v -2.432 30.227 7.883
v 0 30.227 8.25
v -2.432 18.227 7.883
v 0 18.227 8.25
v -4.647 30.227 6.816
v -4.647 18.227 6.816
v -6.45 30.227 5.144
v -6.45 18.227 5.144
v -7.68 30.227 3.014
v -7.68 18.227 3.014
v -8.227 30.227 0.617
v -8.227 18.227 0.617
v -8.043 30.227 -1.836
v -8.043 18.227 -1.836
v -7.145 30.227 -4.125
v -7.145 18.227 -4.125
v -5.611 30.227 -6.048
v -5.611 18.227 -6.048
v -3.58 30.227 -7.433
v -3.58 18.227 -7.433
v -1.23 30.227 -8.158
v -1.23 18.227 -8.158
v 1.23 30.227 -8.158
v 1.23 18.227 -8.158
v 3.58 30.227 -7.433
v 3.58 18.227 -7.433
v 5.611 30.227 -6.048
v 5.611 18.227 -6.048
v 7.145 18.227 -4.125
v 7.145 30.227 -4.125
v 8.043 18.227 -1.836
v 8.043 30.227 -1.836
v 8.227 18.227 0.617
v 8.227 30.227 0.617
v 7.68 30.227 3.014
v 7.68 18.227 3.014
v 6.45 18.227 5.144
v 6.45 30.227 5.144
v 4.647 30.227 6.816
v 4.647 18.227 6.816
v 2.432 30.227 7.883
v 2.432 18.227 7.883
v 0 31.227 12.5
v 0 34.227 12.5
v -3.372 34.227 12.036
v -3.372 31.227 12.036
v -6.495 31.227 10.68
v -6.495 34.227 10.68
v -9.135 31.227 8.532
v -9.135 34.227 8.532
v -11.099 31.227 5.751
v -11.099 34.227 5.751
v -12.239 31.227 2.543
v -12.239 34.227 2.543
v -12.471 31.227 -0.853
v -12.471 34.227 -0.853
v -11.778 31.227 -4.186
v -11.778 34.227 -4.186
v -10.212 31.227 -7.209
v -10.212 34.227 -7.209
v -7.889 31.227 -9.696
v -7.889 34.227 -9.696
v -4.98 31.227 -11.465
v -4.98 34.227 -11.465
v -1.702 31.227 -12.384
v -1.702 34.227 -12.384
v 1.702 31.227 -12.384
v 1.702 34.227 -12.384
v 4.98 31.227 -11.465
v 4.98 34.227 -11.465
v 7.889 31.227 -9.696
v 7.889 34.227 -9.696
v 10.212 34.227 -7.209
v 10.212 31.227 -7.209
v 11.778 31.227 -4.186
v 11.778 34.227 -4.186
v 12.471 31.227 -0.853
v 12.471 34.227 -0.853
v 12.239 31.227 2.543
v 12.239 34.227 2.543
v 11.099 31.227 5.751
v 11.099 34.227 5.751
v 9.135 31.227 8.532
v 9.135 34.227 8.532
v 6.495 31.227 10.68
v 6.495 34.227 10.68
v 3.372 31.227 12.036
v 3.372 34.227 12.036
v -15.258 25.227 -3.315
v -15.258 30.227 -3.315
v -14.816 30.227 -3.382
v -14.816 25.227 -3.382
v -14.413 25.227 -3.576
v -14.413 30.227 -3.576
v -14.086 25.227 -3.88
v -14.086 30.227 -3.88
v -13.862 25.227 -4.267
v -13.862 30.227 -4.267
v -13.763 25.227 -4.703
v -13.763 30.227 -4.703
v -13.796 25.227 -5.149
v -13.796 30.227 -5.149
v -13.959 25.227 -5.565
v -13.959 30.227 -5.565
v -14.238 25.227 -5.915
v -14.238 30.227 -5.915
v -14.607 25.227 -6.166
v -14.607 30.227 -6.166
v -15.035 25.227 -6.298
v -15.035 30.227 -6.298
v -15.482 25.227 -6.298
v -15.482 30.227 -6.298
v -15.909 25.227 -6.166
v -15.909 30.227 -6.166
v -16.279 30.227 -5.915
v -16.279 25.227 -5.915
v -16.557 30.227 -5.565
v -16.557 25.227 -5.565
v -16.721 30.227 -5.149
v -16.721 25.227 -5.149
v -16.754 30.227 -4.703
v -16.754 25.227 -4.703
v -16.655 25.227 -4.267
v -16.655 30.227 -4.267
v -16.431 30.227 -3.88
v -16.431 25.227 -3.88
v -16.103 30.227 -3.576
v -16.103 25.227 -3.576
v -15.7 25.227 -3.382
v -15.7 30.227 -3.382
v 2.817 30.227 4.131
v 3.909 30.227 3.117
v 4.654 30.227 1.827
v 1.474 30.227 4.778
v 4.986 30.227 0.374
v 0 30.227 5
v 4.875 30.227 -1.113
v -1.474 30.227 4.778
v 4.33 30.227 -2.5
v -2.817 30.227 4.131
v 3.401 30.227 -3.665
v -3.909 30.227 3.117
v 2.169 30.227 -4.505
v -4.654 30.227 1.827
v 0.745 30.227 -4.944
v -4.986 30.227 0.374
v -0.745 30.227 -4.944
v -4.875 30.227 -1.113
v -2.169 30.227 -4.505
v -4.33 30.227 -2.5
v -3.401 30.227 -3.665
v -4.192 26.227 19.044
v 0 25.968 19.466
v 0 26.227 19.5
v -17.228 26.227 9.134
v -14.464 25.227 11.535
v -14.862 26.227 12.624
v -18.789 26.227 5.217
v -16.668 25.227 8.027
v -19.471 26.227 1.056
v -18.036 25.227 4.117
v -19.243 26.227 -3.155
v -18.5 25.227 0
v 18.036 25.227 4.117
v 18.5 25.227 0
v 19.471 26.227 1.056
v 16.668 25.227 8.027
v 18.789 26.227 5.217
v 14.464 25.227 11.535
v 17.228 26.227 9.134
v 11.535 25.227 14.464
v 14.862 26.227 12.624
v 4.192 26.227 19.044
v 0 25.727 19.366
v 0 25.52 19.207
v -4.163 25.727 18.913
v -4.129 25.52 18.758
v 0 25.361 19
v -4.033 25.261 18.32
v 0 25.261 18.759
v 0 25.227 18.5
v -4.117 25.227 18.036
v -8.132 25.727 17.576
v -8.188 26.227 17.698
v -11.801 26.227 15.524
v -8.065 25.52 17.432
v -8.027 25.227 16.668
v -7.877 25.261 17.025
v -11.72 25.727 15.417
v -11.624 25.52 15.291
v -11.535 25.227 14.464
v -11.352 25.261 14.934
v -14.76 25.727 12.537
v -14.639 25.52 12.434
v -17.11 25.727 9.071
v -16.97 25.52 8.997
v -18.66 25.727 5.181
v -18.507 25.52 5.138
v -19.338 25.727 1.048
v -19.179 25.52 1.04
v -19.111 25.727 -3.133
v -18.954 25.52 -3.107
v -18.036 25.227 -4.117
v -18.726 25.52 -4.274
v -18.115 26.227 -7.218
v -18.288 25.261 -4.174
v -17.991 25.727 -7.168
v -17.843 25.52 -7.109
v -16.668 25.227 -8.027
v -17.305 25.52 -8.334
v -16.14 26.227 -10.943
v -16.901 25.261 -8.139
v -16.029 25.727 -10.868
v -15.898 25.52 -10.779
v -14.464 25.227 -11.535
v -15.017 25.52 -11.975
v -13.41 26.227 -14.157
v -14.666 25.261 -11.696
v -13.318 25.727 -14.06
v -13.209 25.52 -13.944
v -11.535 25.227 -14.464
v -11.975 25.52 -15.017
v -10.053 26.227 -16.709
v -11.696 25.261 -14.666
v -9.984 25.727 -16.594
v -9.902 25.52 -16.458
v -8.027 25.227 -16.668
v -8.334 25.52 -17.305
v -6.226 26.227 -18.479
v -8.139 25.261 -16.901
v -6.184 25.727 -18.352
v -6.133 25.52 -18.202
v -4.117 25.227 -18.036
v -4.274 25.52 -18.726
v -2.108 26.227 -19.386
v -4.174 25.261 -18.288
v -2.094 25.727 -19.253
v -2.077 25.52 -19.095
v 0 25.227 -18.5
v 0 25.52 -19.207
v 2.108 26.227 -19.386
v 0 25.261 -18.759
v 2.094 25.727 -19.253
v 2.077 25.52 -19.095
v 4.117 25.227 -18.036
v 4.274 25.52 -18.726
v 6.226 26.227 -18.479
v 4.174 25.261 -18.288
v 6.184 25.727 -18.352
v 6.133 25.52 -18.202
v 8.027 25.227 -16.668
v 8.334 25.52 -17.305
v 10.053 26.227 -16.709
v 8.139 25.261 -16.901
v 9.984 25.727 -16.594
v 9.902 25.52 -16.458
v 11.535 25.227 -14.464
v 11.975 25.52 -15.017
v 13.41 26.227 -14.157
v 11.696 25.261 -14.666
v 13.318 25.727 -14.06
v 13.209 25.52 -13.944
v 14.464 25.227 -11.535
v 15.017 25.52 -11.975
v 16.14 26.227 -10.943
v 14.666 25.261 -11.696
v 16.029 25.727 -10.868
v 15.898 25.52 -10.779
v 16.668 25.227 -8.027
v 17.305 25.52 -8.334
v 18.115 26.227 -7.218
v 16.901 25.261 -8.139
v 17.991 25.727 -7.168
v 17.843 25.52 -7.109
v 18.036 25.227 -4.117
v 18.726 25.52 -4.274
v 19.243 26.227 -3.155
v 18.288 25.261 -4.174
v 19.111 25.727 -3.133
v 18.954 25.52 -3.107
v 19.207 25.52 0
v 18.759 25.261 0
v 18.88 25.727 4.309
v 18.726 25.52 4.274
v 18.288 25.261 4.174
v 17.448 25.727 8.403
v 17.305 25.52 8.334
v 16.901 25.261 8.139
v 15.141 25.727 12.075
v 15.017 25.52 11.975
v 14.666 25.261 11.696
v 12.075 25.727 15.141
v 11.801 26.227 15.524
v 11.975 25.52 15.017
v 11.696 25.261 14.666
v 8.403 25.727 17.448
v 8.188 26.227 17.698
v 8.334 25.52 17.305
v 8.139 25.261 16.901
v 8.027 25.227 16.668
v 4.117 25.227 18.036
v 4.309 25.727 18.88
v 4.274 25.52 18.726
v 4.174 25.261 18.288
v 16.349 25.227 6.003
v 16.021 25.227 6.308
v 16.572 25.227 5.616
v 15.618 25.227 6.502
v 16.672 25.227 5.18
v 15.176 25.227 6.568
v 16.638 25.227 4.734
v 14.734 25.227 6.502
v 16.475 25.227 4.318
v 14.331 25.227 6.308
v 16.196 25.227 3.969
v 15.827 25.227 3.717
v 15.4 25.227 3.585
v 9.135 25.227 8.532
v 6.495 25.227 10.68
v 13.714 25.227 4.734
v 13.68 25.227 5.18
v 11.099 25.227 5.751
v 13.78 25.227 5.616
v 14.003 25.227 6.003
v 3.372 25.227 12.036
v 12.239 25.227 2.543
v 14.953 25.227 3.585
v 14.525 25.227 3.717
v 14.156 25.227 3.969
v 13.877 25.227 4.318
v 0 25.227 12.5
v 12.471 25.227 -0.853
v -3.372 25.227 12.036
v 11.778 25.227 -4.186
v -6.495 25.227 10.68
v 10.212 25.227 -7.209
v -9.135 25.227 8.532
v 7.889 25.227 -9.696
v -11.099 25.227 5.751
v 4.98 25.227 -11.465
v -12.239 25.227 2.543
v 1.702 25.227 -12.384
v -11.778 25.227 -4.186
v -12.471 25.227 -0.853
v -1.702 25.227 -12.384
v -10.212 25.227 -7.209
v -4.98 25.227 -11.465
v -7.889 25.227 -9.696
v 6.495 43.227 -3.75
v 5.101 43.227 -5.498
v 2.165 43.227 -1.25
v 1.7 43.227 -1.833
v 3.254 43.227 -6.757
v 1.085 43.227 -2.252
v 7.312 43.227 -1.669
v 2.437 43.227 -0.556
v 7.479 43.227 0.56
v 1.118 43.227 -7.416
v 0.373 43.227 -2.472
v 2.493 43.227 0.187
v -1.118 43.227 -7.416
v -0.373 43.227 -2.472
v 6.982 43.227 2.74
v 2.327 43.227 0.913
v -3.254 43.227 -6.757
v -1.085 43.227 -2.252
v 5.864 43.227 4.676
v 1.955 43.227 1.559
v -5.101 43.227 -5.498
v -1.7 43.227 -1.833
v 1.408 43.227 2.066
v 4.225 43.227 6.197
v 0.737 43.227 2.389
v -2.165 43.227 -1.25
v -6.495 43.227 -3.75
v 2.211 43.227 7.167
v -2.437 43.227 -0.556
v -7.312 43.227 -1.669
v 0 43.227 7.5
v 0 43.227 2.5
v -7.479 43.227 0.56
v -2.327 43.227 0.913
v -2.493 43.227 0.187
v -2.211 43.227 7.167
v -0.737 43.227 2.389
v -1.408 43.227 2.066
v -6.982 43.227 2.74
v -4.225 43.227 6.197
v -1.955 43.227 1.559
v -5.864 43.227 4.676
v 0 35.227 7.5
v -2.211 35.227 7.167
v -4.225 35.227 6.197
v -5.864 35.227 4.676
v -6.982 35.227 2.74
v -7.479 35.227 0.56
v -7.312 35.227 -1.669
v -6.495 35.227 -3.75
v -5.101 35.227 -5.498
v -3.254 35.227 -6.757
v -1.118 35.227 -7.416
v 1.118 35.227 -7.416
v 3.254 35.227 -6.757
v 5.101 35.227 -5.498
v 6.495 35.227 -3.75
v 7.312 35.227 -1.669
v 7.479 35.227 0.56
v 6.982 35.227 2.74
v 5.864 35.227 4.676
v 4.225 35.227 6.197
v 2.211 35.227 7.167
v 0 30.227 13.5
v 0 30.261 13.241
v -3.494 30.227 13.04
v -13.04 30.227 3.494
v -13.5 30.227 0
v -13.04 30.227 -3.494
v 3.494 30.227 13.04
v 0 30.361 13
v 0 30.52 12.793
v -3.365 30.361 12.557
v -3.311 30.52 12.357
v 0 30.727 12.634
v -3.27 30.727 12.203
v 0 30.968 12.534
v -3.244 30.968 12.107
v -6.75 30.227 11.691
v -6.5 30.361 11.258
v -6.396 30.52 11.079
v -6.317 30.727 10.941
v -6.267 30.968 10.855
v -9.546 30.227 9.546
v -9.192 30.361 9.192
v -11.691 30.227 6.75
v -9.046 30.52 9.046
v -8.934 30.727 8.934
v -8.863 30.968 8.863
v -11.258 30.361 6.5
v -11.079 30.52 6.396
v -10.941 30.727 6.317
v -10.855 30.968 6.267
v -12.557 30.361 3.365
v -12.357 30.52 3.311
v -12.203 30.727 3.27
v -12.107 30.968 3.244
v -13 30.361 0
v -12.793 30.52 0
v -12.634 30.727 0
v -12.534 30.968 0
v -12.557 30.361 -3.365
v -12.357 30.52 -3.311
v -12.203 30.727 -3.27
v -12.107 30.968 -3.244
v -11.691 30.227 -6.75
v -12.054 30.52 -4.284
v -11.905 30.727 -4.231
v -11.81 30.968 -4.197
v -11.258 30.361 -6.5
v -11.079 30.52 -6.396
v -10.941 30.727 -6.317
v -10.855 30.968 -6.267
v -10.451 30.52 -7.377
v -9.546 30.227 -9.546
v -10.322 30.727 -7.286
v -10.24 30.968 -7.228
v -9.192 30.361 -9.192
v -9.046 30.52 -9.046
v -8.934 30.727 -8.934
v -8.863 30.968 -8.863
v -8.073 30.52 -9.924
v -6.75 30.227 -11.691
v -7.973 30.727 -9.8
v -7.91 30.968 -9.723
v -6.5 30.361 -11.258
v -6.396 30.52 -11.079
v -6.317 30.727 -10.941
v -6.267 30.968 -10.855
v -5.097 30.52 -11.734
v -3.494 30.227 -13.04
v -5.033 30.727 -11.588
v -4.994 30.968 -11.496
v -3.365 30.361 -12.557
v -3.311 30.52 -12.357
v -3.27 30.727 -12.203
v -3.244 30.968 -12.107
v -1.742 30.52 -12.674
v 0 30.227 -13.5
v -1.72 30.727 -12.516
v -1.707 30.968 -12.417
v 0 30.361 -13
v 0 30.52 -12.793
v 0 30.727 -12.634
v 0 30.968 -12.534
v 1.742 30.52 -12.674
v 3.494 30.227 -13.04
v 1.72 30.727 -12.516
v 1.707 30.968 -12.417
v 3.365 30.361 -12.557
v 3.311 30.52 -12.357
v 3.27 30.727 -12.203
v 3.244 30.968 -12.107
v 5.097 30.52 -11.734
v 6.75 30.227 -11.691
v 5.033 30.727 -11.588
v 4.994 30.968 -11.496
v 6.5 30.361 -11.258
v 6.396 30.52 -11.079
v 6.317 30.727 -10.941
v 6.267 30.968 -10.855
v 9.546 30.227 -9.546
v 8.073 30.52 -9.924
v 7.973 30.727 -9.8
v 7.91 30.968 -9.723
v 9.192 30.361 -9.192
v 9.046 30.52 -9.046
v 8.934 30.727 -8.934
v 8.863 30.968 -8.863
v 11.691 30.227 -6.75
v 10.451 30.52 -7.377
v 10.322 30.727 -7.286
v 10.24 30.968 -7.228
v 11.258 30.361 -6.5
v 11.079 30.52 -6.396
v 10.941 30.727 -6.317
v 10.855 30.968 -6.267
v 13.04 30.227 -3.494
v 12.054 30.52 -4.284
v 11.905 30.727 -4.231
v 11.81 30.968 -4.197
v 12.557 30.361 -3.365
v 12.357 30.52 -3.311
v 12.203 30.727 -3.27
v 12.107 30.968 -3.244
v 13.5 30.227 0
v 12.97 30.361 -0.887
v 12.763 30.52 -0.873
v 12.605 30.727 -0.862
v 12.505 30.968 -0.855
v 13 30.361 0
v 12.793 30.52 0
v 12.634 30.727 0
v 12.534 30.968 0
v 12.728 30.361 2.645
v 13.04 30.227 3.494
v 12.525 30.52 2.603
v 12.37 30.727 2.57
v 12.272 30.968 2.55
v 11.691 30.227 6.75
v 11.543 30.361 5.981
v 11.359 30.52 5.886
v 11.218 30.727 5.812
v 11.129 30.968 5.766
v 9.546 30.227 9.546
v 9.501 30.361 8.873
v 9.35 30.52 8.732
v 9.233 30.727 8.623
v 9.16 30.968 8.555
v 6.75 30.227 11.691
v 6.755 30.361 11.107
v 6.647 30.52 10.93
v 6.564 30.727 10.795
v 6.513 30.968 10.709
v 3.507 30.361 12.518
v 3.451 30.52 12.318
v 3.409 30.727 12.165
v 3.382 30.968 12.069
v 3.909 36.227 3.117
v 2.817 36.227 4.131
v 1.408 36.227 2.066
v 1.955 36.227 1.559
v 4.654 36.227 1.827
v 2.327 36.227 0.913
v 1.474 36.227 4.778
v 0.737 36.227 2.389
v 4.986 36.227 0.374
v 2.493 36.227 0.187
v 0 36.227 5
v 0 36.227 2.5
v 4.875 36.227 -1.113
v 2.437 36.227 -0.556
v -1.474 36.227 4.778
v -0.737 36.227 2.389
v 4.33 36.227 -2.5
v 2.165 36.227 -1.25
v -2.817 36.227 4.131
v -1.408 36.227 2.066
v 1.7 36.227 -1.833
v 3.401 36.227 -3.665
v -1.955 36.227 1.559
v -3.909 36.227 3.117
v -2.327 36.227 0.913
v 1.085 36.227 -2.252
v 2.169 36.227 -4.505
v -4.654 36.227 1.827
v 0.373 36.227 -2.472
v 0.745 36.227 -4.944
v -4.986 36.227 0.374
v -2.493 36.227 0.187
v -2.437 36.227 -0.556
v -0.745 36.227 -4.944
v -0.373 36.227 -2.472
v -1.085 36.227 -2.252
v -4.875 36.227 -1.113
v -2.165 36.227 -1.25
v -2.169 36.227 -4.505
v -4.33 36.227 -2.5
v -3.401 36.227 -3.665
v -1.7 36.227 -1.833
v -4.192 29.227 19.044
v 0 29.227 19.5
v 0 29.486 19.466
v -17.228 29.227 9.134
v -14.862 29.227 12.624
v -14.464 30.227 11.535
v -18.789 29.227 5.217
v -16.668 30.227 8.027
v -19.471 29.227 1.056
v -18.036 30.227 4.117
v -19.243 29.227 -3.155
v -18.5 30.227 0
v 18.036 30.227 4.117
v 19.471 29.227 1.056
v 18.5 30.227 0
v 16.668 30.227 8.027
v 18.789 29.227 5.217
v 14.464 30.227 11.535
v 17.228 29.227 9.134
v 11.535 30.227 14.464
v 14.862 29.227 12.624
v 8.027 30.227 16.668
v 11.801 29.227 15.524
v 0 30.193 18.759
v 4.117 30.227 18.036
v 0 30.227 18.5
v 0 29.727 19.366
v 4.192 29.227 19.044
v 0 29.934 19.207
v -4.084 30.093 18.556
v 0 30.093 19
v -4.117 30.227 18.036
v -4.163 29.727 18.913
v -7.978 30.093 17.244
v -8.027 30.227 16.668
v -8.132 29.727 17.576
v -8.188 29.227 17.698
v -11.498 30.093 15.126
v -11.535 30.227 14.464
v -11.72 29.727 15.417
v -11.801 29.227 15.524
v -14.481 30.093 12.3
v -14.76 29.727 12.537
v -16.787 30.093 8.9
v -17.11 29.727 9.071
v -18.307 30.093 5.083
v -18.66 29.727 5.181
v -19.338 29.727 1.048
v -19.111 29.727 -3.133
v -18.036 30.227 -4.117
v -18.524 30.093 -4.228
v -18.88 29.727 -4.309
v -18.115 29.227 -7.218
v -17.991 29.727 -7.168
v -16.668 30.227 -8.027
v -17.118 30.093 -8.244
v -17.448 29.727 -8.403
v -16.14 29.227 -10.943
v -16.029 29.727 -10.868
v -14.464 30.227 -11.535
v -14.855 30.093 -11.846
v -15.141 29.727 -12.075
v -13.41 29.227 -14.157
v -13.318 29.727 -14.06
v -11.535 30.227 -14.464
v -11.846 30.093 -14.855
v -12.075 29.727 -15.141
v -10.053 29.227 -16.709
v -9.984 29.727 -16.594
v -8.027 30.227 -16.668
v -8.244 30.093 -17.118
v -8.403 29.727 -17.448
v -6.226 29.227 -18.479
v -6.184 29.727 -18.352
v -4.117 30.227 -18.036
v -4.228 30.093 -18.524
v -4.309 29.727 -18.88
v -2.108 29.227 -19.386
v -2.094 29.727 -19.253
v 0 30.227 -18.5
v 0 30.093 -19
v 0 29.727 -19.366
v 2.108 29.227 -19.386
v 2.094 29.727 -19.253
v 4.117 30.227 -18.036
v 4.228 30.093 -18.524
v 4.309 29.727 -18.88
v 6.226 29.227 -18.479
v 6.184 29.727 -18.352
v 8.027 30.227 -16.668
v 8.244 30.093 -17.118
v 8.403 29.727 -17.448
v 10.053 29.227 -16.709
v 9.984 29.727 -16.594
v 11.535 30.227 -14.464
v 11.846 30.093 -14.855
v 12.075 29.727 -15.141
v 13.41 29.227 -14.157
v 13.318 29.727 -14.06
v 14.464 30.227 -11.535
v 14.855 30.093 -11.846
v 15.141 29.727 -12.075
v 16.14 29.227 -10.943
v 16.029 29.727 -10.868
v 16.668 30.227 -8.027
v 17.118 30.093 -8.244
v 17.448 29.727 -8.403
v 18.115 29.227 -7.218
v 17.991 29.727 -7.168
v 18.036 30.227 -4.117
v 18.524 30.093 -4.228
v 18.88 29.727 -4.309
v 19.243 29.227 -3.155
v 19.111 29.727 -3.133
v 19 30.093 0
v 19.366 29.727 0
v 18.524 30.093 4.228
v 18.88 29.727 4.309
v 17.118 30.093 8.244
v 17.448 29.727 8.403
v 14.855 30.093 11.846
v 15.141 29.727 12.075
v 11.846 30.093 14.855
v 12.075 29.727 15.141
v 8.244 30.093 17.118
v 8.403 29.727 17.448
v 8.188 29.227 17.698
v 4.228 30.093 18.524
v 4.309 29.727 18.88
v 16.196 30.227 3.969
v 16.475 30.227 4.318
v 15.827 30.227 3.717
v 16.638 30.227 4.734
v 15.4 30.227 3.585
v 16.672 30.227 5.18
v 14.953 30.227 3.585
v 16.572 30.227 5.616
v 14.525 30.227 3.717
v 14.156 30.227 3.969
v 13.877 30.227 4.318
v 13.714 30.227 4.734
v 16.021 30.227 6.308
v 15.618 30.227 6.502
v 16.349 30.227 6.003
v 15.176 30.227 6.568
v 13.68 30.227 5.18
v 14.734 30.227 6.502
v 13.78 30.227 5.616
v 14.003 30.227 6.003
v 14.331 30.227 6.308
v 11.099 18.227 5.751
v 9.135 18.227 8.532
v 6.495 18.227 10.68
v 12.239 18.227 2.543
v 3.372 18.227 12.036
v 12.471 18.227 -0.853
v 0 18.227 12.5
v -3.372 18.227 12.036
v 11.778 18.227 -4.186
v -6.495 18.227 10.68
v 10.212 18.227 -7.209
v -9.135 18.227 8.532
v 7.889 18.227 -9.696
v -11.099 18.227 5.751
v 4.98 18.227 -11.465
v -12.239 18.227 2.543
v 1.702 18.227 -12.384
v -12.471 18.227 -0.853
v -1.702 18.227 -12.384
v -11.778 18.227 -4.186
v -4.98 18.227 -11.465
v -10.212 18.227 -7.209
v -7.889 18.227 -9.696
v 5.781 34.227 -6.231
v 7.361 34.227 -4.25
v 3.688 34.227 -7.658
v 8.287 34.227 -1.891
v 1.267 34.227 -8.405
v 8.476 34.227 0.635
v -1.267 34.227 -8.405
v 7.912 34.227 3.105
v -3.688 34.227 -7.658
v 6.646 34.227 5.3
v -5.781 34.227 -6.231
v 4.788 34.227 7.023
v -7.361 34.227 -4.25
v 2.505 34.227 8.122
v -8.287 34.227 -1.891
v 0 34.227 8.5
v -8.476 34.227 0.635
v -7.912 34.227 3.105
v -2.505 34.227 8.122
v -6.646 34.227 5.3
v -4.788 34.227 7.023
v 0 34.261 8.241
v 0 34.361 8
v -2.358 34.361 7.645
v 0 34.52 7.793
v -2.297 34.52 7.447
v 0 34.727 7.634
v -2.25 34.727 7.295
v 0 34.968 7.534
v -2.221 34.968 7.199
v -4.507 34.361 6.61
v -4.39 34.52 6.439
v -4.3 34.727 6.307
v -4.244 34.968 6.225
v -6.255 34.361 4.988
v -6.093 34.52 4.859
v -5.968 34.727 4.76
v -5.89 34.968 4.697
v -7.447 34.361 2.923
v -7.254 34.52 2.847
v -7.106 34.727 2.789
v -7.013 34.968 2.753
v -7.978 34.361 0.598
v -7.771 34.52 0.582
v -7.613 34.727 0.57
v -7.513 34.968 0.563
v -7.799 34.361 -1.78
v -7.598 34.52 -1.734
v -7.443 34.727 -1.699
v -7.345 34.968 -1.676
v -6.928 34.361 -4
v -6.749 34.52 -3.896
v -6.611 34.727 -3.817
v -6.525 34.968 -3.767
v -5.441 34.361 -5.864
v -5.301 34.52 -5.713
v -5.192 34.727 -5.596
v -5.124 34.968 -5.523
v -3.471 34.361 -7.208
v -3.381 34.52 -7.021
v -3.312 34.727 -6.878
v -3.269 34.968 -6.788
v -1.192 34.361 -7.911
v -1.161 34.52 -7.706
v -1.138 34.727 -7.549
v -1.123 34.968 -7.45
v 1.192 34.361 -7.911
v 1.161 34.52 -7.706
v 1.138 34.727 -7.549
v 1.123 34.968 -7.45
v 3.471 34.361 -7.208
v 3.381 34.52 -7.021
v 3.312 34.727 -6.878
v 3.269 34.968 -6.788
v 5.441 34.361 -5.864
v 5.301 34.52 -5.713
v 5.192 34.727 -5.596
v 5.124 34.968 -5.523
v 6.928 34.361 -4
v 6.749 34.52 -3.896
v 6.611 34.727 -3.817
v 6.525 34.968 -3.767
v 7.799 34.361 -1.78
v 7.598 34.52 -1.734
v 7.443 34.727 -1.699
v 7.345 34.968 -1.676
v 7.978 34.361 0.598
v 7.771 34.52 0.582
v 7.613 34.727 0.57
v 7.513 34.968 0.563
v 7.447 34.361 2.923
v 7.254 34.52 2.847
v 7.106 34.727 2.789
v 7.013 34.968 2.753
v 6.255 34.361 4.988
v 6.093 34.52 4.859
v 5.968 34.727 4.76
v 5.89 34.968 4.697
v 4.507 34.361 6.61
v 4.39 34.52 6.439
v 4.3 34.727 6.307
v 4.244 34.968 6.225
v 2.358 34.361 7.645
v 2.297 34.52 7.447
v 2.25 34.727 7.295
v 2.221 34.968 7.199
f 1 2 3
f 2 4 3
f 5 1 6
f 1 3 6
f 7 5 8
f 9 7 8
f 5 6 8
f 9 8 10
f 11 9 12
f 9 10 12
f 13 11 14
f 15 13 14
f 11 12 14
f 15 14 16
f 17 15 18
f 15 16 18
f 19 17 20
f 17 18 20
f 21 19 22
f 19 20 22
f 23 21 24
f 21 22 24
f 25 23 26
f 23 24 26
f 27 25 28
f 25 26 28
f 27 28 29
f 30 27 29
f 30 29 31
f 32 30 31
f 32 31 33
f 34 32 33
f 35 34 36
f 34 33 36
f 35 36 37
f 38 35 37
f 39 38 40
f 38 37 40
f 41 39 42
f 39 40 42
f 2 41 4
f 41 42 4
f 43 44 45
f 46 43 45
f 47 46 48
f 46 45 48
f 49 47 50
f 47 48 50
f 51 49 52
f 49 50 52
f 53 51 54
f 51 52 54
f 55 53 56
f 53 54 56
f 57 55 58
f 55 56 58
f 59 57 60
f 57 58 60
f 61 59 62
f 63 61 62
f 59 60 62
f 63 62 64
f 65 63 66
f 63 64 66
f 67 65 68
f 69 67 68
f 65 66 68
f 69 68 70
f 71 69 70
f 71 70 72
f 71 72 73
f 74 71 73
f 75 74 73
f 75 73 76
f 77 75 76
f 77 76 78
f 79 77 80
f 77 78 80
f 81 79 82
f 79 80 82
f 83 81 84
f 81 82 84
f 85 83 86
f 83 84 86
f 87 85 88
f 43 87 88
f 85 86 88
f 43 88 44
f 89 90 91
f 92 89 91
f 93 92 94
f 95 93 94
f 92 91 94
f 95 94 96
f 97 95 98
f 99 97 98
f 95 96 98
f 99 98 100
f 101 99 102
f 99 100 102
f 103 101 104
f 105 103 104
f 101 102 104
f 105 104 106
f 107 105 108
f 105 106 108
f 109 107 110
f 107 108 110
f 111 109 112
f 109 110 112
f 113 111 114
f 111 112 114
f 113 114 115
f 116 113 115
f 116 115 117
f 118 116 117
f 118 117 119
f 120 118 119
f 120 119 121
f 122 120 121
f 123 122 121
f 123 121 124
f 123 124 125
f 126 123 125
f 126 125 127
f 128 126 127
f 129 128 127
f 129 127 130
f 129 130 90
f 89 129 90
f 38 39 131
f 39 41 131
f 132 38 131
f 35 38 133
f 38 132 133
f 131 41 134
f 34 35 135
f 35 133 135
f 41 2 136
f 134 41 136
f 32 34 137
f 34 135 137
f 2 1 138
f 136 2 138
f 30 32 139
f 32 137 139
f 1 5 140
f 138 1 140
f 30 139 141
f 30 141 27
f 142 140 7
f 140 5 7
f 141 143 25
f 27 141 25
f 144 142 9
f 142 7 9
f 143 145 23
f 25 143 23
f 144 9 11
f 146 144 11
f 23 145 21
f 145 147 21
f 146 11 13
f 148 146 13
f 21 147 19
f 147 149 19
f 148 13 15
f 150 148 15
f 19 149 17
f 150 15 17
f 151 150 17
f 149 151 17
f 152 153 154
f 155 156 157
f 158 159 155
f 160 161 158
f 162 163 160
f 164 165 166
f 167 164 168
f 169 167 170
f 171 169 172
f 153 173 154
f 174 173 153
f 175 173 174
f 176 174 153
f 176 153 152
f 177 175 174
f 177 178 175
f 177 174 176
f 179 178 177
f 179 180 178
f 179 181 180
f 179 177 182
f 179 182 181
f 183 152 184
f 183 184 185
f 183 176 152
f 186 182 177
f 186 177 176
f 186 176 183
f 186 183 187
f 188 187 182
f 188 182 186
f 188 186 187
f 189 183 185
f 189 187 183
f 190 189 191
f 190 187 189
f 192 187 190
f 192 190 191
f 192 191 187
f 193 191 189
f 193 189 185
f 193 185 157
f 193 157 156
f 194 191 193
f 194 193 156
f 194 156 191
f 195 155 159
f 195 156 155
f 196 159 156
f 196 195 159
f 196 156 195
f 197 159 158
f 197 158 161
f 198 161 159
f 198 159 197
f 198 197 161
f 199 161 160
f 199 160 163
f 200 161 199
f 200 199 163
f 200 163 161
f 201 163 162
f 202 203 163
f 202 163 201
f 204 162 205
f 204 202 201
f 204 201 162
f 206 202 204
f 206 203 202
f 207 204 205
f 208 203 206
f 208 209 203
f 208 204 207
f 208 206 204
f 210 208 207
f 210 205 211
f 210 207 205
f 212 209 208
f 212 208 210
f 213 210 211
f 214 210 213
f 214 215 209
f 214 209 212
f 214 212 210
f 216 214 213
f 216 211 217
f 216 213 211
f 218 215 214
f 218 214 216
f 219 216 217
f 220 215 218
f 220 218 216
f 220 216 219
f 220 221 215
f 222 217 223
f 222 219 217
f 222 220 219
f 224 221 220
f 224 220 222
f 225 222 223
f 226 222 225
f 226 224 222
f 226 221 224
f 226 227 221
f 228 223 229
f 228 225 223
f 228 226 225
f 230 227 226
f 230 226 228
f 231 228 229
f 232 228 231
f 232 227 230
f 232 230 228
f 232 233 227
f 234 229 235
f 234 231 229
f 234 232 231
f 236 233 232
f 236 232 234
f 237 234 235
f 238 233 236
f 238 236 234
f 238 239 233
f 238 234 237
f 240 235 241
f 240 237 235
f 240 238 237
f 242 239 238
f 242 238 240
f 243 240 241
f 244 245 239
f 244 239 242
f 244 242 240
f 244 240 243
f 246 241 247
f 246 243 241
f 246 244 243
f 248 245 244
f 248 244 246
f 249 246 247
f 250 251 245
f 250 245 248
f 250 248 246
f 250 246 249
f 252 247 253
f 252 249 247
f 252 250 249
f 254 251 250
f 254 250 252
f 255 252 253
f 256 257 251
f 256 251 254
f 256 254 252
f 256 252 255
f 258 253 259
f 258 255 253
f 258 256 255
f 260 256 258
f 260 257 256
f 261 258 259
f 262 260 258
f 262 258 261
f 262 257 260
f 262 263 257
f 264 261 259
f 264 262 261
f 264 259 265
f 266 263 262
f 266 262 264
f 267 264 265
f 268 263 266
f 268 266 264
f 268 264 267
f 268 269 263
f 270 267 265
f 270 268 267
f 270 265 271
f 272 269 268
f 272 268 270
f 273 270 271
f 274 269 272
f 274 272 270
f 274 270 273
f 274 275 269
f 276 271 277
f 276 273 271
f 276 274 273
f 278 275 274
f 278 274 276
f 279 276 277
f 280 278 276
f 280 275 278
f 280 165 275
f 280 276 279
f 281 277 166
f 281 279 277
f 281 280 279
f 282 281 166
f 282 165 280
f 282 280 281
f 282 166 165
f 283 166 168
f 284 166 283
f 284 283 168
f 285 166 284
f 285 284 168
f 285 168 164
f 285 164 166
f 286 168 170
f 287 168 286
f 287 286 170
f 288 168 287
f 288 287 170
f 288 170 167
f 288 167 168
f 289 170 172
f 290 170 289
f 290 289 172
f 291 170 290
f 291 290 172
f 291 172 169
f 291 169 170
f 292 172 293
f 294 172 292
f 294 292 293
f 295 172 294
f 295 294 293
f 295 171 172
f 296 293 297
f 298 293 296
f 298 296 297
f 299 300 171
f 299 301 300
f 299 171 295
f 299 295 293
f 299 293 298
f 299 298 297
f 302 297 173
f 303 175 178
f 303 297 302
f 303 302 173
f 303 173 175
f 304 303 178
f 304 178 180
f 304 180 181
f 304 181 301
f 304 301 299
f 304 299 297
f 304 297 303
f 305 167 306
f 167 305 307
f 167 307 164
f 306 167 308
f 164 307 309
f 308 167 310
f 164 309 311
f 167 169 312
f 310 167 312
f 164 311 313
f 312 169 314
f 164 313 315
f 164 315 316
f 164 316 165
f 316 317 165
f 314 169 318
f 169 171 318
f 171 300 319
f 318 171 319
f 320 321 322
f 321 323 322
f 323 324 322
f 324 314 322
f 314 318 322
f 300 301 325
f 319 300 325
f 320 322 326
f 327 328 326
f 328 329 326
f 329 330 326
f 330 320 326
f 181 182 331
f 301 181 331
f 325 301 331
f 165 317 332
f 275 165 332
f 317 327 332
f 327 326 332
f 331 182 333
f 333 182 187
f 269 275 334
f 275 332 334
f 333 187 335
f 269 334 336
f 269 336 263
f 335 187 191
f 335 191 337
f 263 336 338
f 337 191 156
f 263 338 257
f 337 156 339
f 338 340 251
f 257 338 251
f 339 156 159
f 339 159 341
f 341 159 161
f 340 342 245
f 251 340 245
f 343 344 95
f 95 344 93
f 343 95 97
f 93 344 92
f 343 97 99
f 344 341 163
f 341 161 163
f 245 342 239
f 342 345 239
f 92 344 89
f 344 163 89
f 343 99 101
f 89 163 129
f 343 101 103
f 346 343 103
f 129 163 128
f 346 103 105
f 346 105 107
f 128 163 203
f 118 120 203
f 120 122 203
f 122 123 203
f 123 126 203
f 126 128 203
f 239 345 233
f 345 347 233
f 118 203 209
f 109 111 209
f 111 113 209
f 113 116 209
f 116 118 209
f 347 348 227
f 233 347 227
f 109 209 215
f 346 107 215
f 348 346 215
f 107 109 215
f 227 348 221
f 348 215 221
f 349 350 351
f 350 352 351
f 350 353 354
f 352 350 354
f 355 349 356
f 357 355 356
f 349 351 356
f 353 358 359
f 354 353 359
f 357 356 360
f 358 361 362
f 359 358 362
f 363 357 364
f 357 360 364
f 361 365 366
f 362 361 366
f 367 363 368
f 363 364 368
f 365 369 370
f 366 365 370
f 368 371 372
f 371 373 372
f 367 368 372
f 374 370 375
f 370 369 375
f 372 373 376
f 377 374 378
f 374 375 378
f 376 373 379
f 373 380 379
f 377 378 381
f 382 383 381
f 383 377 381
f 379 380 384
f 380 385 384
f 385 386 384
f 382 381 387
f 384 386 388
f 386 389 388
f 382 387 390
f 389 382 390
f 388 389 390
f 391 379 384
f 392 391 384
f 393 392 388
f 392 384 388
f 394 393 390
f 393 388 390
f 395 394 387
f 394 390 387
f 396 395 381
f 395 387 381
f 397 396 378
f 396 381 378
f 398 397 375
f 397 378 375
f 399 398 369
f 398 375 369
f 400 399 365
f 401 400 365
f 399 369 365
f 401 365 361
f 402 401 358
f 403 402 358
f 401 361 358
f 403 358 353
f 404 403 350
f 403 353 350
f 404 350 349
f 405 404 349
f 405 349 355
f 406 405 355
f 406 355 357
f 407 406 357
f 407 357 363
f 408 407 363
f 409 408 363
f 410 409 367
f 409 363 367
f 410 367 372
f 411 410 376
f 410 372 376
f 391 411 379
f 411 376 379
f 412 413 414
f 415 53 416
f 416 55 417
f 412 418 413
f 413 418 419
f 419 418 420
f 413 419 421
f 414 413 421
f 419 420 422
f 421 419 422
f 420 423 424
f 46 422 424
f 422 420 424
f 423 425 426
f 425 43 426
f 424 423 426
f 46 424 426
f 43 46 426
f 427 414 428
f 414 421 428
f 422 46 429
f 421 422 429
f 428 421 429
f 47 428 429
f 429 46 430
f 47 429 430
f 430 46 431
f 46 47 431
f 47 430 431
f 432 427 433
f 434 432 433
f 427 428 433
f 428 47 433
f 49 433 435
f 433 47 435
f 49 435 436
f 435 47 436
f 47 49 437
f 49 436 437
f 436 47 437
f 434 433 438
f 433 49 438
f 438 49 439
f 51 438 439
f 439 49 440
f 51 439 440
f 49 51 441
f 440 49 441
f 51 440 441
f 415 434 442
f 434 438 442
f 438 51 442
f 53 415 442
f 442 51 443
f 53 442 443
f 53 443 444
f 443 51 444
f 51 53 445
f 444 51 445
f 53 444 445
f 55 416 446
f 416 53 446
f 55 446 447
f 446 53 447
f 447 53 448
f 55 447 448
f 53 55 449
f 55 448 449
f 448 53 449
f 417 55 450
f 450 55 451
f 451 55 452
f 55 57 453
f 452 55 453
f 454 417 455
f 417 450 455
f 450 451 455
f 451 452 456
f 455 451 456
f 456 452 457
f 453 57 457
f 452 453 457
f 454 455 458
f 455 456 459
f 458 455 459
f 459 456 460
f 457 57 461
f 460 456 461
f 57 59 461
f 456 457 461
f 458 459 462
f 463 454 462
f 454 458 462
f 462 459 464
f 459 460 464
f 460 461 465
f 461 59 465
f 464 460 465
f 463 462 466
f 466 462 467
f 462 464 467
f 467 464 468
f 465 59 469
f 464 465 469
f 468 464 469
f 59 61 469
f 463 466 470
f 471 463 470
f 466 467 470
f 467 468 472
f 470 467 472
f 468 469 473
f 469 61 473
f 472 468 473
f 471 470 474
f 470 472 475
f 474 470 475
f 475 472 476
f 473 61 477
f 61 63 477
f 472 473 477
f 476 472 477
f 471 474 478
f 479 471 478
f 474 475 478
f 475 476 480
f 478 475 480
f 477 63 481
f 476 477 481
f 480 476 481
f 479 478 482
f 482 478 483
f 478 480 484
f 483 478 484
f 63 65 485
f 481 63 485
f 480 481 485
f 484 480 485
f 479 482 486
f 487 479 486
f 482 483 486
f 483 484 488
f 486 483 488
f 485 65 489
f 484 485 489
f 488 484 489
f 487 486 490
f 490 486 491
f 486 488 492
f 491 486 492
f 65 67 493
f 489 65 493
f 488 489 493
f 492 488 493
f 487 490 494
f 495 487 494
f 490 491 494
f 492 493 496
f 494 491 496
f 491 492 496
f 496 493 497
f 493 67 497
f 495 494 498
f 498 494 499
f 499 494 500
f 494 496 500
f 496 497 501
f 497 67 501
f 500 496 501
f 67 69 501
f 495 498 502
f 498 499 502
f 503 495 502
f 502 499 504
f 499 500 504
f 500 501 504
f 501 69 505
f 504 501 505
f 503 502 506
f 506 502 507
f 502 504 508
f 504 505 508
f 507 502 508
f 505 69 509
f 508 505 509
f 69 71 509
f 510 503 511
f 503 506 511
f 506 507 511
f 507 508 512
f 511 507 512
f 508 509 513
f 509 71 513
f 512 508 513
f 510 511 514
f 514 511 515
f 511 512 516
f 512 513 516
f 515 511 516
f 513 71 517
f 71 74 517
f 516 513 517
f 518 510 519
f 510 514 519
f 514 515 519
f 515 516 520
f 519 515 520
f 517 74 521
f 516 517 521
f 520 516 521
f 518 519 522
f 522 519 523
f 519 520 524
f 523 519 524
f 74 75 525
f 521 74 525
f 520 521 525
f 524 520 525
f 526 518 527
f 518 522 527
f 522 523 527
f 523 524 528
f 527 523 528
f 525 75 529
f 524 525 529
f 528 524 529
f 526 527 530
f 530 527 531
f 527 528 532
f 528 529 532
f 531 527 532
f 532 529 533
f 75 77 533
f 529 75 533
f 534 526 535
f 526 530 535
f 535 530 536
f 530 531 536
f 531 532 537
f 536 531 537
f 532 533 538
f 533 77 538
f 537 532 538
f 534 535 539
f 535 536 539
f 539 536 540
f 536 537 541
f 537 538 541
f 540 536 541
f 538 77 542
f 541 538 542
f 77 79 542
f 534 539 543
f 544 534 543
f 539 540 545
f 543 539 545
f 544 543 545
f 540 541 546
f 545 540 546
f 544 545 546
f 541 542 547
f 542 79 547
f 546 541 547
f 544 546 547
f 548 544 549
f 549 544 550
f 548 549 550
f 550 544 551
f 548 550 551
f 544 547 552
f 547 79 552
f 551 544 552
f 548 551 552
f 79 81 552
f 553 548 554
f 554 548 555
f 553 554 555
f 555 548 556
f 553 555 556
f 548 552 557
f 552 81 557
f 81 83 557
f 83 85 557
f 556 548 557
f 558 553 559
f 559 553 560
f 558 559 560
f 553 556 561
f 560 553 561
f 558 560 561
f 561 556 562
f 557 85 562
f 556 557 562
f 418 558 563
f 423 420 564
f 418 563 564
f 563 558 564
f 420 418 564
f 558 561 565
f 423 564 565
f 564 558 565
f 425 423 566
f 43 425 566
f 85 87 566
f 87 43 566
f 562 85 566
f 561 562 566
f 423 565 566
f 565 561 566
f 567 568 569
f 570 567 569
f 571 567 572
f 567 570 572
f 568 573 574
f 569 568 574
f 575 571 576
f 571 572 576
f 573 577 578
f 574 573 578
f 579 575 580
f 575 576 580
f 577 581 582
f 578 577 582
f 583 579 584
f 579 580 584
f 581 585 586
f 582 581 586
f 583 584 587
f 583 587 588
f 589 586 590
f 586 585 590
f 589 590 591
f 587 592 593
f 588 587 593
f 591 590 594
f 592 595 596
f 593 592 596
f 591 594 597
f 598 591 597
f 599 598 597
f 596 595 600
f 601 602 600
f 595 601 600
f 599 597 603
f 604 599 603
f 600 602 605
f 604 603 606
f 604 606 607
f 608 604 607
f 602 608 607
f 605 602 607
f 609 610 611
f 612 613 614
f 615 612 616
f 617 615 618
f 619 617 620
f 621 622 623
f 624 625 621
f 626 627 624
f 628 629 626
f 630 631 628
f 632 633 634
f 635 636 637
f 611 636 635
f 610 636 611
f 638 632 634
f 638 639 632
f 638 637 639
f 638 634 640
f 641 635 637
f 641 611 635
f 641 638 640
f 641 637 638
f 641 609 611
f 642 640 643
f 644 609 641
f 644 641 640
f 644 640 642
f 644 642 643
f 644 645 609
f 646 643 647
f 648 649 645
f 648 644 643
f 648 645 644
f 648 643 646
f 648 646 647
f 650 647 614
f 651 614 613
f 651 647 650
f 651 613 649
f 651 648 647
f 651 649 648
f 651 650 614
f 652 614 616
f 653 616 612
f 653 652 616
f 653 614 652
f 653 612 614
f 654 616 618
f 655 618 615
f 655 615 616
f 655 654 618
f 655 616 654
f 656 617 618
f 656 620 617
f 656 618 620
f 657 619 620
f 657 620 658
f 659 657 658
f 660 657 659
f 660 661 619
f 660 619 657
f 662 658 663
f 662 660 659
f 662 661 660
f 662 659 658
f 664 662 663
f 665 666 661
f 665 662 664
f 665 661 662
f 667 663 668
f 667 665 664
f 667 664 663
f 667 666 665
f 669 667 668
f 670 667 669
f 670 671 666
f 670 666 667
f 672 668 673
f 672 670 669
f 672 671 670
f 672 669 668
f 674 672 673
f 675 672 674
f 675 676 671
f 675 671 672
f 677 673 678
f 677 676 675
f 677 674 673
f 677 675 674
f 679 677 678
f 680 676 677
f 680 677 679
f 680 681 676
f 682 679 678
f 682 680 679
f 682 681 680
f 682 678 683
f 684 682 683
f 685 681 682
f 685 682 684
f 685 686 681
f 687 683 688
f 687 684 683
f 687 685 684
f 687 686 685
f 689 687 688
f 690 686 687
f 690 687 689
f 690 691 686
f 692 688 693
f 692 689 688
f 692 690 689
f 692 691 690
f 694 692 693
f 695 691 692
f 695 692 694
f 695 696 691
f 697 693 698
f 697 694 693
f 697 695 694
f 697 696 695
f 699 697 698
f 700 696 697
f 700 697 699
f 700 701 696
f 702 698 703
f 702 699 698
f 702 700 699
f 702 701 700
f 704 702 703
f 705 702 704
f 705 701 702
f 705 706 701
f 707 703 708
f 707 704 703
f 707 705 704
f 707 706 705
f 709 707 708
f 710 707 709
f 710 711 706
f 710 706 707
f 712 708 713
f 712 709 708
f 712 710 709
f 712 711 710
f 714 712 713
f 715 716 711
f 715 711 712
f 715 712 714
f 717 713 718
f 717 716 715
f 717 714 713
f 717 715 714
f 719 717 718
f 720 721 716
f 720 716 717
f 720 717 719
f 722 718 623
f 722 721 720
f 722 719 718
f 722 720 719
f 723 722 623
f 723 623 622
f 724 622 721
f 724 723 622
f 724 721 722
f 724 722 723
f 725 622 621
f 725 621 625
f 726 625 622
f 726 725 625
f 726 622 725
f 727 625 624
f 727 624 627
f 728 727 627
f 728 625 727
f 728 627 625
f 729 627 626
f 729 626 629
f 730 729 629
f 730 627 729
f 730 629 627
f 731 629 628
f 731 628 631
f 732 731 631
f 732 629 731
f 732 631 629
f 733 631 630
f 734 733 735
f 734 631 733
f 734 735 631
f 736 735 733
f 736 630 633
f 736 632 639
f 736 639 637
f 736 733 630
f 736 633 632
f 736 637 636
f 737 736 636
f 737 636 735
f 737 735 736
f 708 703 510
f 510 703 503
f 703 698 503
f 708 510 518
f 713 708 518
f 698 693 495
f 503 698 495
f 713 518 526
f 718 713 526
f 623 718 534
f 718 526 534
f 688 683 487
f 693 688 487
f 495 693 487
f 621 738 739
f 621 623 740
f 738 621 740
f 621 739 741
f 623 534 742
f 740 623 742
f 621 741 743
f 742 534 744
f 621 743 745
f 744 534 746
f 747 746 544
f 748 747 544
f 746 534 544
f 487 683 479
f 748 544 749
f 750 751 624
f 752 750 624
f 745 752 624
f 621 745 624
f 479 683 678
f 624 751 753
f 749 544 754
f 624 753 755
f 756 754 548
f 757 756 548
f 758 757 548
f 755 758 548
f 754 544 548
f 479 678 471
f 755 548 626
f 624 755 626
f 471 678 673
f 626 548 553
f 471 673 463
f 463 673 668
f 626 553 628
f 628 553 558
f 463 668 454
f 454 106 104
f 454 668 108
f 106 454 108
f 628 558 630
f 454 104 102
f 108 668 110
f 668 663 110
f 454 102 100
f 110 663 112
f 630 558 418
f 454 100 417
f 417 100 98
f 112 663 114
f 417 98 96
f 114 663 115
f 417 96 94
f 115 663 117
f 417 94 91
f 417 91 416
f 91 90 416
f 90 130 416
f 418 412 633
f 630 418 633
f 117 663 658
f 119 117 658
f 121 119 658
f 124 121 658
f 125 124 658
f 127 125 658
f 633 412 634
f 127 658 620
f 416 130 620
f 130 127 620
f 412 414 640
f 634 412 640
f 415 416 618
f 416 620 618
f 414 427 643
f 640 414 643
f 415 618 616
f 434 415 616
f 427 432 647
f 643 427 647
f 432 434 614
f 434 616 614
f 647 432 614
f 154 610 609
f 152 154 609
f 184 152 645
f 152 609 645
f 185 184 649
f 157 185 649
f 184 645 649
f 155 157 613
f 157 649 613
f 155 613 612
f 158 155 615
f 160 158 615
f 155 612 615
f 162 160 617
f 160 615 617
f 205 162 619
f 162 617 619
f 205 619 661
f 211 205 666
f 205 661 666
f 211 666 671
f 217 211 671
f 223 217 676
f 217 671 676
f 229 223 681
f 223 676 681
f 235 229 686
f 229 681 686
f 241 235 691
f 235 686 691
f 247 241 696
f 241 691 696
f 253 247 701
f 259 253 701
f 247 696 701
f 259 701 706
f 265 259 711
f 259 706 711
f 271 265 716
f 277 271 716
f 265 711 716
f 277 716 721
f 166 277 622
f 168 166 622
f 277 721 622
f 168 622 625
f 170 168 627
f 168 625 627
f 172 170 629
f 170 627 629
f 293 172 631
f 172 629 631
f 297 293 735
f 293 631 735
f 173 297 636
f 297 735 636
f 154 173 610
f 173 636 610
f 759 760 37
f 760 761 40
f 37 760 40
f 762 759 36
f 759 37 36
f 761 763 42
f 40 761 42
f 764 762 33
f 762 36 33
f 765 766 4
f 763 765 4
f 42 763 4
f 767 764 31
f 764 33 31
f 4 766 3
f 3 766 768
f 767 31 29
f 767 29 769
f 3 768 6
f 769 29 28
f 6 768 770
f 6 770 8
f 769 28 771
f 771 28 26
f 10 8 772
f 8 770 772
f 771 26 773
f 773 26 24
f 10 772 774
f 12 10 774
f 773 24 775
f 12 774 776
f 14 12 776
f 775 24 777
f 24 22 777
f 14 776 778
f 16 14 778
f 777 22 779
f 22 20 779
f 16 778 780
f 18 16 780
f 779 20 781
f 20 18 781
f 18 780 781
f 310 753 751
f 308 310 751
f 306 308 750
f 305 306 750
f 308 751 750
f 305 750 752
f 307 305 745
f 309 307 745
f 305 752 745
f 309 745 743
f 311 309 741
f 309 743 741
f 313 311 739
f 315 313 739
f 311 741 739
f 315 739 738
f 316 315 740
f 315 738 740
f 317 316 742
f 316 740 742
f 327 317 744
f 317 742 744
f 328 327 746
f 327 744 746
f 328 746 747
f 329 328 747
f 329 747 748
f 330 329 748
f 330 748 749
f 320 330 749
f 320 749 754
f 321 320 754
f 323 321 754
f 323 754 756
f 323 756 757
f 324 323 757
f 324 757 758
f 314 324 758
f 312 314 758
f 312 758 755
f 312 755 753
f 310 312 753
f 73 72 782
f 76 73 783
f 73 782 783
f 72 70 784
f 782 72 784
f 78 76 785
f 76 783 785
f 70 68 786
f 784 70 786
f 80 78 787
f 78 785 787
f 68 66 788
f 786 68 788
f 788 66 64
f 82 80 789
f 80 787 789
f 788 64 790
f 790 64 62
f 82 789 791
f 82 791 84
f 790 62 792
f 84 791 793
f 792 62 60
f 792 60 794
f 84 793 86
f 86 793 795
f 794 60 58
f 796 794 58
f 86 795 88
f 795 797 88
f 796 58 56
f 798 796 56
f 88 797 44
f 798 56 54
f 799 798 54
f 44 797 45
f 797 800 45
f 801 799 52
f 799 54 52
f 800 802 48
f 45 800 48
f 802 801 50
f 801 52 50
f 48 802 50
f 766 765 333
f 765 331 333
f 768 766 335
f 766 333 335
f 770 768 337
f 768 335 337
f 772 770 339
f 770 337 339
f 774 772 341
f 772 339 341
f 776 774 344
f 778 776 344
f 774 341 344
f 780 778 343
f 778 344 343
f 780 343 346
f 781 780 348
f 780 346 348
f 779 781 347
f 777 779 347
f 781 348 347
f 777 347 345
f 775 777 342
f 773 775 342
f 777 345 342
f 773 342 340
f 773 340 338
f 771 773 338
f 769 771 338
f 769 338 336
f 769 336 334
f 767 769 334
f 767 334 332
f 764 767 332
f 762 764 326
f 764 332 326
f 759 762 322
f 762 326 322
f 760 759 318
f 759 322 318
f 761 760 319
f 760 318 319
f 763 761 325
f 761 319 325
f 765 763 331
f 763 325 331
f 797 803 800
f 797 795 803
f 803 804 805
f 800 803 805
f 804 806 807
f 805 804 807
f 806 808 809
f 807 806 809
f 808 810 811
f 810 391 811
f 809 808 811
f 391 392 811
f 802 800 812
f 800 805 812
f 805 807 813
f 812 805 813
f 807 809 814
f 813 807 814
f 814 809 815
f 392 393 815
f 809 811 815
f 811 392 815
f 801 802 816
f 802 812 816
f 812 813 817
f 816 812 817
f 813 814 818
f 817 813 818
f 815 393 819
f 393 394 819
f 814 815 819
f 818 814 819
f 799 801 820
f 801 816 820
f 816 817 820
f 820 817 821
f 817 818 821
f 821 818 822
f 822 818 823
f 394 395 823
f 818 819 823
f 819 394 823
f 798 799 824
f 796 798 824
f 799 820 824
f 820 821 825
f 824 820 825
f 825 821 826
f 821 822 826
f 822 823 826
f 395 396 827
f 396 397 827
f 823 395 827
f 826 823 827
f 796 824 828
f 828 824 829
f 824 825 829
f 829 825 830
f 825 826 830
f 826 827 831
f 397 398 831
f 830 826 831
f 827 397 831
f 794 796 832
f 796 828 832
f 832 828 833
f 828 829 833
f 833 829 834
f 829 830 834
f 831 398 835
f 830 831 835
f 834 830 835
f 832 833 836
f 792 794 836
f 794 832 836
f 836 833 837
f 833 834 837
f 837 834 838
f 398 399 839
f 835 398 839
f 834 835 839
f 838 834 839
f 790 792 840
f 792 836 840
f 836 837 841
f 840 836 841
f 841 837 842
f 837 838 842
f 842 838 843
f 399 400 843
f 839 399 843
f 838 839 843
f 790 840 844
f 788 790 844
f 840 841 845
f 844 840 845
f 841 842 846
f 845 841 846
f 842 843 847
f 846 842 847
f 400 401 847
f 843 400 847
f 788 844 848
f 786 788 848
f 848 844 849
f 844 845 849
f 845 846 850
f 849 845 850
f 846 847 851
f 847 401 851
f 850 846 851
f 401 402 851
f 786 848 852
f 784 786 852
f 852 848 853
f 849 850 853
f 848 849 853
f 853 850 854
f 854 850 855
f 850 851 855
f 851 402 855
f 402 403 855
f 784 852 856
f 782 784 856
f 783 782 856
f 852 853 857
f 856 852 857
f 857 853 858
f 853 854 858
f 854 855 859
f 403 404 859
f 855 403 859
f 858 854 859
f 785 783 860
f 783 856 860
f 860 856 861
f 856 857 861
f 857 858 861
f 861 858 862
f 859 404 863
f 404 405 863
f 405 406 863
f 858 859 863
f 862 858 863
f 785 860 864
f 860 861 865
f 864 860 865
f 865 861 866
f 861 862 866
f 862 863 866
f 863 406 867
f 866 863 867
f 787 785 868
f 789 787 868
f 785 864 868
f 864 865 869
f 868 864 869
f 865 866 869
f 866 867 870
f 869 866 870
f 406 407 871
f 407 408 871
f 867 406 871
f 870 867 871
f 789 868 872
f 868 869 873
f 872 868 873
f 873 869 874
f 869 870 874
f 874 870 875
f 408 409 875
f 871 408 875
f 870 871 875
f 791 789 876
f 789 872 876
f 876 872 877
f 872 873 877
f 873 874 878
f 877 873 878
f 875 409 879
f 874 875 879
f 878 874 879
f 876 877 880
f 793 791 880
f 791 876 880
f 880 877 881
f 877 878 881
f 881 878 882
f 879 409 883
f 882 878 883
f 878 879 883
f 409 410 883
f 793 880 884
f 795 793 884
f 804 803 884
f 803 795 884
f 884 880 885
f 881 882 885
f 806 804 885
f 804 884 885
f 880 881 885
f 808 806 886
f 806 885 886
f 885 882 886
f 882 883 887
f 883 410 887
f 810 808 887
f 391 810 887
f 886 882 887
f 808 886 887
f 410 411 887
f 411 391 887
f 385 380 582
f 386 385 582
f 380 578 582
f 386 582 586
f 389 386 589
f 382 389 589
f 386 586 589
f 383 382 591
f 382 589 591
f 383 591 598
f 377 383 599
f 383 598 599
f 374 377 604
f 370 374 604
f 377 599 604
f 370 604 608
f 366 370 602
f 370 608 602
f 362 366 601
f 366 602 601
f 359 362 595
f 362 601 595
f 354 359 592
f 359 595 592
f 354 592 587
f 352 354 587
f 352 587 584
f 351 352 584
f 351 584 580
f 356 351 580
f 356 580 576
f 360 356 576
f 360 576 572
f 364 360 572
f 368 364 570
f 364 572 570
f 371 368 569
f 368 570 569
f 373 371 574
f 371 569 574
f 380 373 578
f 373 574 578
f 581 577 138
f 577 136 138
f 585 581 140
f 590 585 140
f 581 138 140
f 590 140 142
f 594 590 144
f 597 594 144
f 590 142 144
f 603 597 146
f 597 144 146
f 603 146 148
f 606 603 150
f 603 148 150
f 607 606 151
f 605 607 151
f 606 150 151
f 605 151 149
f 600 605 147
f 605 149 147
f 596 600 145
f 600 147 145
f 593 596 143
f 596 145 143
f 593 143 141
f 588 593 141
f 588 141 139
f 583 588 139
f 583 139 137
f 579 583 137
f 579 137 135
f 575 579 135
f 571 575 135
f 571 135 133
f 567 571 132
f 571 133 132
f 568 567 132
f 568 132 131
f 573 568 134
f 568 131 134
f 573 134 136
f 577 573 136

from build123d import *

# Parameters (mm, degrees)
FILLET1_R          = 1
FILLET2_R          = 1
SKETCH3_R          = 1.5
CUT_EXTRUDE1_DEPTH = 20


with BuildPart() as part:
    # Sketch2 → Revolve1 (revolve)
    with BuildSketch(Plane(origin=(0, 0, 0), x_dir=(0, 0, -1), z_dir=(1, 0, 0))):
        Polygon((-2.5, 43.227272727), (-2.5, 36.227272727), (-5, 36.227272727), (-5, 30.227272727), (-8.25, 30.227272727), (-8.25, 18.227272727), (-12.5, 18.227272727), (-12.5, 25.227272727), (-19.5, 25.227272727), (-19.5, 30.227272727), (-12.5, 30.227272727), (-12.5, 34.227272727), (-7.5, 34.227272727), (-7.5, 43.227272727), align=None)
    revolve(axis=Axis((0, 55.454545455, 0), (0, -1, 0)))

    # Fillet1
    fillet1_edges = [part.edges().sort_by_distance(p)[0] for p in [
        (0, 30.227272727, -12.5),
        (0, 34.227272727, -7.5),
    ]]
    fillet(fillet1_edges, radius=FILLET1_R)

    # Fillet2
    fillet2_edges = [part.edges().sort_by_distance(p)[0] for p in [
        (0, 25.227272727, -19.5),
        (0, 30.227272727, -19.5),
    ]]
    fillet(fillet2_edges, radius=FILLET2_R)

    # Sketch3 → Cut-Extrude1 (cut)
    with BuildSketch(Plane(origin=(0, 30.227272727, 0), x_dir=(1, 0, 0), z_dir=(0, 1, 0))):
        with Locations((15.176066716, -5.068234312)):
            Circle(SKETCH3_R)
        with Locations((-15.258311064, 4.814970764)):
            Circle(SKETCH3_R)
    extrude(amount=-CUT_EXTRUDE1_DEPTH, mode=Mode.SUBTRACT)


solid = part.part
